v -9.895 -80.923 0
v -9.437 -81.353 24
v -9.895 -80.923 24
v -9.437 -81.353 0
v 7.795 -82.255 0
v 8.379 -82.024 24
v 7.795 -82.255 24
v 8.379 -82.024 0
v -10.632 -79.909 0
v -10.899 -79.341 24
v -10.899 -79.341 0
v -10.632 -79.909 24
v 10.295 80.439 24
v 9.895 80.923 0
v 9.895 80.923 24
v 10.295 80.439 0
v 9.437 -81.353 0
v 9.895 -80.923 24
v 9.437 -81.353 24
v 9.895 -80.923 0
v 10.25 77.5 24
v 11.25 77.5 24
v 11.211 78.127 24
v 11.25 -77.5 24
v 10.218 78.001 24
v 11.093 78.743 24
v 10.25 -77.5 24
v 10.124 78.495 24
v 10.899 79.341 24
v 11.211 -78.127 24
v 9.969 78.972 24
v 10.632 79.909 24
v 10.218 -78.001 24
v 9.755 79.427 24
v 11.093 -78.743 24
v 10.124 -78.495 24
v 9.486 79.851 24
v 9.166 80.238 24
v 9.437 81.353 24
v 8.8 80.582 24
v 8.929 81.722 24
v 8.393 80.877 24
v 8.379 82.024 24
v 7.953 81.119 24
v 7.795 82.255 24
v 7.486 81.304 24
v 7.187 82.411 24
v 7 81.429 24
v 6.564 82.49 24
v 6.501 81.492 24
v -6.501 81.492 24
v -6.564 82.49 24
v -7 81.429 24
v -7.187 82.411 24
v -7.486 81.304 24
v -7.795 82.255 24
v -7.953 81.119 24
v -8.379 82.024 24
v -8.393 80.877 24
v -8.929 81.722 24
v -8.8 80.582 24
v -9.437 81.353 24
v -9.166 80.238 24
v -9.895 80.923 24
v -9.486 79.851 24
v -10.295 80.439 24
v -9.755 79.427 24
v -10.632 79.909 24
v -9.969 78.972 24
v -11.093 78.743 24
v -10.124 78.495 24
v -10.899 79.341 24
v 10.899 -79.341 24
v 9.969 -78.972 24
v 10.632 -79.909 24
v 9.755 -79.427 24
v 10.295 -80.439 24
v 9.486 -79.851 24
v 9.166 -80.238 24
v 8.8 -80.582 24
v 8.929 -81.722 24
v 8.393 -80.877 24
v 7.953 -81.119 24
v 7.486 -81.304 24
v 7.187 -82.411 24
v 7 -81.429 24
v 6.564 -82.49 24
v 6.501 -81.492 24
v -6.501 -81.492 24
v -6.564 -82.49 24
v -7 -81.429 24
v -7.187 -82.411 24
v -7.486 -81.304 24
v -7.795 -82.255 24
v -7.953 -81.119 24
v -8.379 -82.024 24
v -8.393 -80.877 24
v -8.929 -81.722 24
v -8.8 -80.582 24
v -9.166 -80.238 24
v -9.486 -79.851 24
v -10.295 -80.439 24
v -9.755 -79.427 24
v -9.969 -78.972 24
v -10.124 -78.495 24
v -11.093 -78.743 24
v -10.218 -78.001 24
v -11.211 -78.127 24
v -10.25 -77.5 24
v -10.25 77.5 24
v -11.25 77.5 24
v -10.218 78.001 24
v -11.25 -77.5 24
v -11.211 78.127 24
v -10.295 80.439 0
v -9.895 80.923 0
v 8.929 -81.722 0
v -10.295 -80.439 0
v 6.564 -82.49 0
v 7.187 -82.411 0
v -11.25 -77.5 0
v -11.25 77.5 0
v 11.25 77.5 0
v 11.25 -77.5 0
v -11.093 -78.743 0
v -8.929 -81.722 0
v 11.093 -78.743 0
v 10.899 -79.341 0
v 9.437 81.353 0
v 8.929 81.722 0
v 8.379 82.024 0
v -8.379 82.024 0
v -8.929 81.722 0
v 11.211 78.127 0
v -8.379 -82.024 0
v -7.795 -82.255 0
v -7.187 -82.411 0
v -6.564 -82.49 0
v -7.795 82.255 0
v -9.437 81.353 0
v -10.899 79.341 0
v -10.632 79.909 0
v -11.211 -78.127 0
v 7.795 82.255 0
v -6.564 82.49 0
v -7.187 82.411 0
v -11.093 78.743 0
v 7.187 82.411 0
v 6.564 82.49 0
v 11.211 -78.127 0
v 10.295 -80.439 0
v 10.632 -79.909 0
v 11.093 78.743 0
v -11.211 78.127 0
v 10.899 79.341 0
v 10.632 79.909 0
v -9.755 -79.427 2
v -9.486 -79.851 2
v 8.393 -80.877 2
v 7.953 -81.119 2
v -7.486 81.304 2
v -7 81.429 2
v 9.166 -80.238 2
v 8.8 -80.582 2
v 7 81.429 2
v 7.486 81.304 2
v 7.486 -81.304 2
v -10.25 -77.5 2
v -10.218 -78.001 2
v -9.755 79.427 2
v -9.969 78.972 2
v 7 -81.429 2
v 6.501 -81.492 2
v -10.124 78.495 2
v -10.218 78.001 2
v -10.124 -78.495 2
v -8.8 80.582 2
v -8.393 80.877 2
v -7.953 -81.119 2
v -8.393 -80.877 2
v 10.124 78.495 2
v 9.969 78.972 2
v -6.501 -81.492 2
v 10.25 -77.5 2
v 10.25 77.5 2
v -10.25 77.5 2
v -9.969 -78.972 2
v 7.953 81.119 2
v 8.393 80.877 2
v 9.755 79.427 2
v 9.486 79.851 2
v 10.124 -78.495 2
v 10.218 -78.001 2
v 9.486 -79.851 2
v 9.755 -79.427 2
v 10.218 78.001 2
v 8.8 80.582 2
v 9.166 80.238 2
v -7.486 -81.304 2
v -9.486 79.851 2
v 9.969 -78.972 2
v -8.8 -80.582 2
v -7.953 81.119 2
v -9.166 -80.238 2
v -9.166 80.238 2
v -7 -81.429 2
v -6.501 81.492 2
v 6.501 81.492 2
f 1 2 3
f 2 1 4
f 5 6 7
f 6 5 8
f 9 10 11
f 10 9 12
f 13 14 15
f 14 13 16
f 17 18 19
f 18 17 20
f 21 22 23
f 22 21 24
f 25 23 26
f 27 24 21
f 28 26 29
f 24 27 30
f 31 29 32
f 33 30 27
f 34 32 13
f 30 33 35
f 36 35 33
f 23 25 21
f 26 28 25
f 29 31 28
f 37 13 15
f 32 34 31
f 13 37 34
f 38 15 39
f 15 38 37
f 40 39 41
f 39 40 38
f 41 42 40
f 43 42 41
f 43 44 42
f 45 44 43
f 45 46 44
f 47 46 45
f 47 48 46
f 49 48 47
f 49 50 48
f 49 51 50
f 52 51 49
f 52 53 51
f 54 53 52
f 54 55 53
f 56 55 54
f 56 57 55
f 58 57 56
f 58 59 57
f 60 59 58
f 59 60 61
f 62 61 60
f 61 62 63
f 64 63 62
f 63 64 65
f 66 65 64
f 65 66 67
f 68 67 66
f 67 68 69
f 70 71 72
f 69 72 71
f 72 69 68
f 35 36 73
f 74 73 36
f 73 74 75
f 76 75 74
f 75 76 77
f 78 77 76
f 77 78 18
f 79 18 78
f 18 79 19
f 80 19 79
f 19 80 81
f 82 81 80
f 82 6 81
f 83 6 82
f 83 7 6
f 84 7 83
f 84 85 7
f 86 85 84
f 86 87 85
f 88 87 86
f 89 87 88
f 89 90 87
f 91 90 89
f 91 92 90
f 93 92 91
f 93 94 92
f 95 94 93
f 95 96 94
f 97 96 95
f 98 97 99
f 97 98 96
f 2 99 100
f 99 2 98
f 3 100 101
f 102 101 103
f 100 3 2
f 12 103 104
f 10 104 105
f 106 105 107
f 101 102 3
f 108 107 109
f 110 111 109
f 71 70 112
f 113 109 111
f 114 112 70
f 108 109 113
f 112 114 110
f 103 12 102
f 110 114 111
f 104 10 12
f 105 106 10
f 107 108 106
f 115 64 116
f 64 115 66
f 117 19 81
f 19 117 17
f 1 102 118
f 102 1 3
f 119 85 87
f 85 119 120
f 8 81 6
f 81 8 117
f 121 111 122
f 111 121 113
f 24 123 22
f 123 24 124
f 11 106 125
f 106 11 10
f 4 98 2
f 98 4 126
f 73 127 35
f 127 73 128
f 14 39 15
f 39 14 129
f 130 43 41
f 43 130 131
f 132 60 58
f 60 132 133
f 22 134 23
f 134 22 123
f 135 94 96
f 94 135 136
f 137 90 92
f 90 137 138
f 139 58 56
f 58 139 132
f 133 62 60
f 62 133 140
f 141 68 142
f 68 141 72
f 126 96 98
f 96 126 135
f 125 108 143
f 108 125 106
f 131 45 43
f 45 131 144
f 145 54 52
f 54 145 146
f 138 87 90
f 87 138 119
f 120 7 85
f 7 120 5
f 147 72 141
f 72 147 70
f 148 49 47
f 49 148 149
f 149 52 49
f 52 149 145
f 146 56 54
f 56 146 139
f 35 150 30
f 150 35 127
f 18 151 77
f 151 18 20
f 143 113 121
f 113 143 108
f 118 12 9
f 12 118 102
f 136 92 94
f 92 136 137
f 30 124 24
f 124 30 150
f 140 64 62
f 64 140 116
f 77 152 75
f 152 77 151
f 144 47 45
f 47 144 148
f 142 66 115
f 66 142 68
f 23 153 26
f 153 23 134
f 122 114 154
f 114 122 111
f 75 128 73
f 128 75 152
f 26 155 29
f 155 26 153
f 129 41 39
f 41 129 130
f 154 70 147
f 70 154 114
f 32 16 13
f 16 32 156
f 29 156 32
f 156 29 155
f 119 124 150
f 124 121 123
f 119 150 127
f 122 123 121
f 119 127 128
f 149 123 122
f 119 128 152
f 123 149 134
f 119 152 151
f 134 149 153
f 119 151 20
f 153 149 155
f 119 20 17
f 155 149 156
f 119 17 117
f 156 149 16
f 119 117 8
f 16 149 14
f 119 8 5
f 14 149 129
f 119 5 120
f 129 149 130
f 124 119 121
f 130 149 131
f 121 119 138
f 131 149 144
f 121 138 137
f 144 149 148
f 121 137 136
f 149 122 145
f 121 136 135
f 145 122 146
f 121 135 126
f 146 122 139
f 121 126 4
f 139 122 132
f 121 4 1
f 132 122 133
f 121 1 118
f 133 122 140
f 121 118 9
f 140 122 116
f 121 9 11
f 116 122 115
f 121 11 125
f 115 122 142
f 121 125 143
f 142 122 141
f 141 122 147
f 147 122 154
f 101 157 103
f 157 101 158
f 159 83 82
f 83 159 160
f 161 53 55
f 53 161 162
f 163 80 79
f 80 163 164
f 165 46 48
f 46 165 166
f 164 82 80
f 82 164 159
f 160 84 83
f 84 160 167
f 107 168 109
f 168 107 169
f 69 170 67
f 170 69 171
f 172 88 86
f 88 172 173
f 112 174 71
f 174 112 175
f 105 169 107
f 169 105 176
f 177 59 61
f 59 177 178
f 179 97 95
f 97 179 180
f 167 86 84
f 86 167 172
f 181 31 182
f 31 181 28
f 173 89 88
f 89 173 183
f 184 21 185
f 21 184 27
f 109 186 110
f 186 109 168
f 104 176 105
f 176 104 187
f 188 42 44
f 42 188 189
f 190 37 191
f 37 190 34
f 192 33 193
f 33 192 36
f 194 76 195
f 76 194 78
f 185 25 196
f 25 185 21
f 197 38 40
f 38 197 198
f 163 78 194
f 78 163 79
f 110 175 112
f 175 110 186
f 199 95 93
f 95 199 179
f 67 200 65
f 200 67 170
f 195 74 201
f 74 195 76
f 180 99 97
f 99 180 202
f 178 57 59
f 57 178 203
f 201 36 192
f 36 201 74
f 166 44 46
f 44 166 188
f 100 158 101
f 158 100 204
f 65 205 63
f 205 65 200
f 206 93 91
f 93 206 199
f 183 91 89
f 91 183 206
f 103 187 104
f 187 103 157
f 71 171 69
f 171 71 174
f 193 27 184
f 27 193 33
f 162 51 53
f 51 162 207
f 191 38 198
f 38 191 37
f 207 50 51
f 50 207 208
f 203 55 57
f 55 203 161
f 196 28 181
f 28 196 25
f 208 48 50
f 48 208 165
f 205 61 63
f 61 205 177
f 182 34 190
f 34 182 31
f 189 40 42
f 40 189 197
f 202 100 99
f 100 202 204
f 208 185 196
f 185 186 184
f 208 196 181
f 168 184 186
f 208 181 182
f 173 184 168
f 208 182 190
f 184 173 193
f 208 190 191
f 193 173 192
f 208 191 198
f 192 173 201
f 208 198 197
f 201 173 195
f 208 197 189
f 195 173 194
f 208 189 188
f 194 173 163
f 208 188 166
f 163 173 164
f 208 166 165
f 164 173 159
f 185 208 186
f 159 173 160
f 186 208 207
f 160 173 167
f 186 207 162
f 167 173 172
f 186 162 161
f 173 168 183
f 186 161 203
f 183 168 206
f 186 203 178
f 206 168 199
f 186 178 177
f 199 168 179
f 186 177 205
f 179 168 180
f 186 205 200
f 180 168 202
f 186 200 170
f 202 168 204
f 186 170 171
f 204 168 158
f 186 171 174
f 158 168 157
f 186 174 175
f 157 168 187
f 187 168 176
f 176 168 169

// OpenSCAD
$fn = 50;


difference() {
	union() {
		hull() {
			translate(v = [-6.2500000000, 77.5000000000, 0]) {
				cylinder(h = 24, r = 5);
			}
			translate(v = [6.2500000000, 77.5000000000, 0]) {
				cylinder(h = 24, r = 5);
			}
			translate(v = [-6.2500000000, -77.5000000000, 0]) {
				cylinder(h = 24, r = 5);
			}
			translate(v = [6.2500000000, -77.5000000000, 0]) {
				cylinder(h = 24, r = 5);
			}
		}
	}
	union() {
		translate(v = [0, 0, 2]) {
			hull() {
				translate(v = [-6.2500000000, 77.5000000000, 0]) {
					cylinder(h = 22, r = 4);
				}
				translate(v = [6.2500000000, 77.5000000000, 0]) {
					cylinder(h = 22, r = 4);
				}
				translate(v = [-6.2500000000, -77.5000000000, 0]) {
					cylinder(h = 22, r = 4);
				}
				translate(v = [6.2500000000, -77.5000000000, 0]) {
					cylinder(h = 22, r = 4);
				}
			}
		}
	}
}
